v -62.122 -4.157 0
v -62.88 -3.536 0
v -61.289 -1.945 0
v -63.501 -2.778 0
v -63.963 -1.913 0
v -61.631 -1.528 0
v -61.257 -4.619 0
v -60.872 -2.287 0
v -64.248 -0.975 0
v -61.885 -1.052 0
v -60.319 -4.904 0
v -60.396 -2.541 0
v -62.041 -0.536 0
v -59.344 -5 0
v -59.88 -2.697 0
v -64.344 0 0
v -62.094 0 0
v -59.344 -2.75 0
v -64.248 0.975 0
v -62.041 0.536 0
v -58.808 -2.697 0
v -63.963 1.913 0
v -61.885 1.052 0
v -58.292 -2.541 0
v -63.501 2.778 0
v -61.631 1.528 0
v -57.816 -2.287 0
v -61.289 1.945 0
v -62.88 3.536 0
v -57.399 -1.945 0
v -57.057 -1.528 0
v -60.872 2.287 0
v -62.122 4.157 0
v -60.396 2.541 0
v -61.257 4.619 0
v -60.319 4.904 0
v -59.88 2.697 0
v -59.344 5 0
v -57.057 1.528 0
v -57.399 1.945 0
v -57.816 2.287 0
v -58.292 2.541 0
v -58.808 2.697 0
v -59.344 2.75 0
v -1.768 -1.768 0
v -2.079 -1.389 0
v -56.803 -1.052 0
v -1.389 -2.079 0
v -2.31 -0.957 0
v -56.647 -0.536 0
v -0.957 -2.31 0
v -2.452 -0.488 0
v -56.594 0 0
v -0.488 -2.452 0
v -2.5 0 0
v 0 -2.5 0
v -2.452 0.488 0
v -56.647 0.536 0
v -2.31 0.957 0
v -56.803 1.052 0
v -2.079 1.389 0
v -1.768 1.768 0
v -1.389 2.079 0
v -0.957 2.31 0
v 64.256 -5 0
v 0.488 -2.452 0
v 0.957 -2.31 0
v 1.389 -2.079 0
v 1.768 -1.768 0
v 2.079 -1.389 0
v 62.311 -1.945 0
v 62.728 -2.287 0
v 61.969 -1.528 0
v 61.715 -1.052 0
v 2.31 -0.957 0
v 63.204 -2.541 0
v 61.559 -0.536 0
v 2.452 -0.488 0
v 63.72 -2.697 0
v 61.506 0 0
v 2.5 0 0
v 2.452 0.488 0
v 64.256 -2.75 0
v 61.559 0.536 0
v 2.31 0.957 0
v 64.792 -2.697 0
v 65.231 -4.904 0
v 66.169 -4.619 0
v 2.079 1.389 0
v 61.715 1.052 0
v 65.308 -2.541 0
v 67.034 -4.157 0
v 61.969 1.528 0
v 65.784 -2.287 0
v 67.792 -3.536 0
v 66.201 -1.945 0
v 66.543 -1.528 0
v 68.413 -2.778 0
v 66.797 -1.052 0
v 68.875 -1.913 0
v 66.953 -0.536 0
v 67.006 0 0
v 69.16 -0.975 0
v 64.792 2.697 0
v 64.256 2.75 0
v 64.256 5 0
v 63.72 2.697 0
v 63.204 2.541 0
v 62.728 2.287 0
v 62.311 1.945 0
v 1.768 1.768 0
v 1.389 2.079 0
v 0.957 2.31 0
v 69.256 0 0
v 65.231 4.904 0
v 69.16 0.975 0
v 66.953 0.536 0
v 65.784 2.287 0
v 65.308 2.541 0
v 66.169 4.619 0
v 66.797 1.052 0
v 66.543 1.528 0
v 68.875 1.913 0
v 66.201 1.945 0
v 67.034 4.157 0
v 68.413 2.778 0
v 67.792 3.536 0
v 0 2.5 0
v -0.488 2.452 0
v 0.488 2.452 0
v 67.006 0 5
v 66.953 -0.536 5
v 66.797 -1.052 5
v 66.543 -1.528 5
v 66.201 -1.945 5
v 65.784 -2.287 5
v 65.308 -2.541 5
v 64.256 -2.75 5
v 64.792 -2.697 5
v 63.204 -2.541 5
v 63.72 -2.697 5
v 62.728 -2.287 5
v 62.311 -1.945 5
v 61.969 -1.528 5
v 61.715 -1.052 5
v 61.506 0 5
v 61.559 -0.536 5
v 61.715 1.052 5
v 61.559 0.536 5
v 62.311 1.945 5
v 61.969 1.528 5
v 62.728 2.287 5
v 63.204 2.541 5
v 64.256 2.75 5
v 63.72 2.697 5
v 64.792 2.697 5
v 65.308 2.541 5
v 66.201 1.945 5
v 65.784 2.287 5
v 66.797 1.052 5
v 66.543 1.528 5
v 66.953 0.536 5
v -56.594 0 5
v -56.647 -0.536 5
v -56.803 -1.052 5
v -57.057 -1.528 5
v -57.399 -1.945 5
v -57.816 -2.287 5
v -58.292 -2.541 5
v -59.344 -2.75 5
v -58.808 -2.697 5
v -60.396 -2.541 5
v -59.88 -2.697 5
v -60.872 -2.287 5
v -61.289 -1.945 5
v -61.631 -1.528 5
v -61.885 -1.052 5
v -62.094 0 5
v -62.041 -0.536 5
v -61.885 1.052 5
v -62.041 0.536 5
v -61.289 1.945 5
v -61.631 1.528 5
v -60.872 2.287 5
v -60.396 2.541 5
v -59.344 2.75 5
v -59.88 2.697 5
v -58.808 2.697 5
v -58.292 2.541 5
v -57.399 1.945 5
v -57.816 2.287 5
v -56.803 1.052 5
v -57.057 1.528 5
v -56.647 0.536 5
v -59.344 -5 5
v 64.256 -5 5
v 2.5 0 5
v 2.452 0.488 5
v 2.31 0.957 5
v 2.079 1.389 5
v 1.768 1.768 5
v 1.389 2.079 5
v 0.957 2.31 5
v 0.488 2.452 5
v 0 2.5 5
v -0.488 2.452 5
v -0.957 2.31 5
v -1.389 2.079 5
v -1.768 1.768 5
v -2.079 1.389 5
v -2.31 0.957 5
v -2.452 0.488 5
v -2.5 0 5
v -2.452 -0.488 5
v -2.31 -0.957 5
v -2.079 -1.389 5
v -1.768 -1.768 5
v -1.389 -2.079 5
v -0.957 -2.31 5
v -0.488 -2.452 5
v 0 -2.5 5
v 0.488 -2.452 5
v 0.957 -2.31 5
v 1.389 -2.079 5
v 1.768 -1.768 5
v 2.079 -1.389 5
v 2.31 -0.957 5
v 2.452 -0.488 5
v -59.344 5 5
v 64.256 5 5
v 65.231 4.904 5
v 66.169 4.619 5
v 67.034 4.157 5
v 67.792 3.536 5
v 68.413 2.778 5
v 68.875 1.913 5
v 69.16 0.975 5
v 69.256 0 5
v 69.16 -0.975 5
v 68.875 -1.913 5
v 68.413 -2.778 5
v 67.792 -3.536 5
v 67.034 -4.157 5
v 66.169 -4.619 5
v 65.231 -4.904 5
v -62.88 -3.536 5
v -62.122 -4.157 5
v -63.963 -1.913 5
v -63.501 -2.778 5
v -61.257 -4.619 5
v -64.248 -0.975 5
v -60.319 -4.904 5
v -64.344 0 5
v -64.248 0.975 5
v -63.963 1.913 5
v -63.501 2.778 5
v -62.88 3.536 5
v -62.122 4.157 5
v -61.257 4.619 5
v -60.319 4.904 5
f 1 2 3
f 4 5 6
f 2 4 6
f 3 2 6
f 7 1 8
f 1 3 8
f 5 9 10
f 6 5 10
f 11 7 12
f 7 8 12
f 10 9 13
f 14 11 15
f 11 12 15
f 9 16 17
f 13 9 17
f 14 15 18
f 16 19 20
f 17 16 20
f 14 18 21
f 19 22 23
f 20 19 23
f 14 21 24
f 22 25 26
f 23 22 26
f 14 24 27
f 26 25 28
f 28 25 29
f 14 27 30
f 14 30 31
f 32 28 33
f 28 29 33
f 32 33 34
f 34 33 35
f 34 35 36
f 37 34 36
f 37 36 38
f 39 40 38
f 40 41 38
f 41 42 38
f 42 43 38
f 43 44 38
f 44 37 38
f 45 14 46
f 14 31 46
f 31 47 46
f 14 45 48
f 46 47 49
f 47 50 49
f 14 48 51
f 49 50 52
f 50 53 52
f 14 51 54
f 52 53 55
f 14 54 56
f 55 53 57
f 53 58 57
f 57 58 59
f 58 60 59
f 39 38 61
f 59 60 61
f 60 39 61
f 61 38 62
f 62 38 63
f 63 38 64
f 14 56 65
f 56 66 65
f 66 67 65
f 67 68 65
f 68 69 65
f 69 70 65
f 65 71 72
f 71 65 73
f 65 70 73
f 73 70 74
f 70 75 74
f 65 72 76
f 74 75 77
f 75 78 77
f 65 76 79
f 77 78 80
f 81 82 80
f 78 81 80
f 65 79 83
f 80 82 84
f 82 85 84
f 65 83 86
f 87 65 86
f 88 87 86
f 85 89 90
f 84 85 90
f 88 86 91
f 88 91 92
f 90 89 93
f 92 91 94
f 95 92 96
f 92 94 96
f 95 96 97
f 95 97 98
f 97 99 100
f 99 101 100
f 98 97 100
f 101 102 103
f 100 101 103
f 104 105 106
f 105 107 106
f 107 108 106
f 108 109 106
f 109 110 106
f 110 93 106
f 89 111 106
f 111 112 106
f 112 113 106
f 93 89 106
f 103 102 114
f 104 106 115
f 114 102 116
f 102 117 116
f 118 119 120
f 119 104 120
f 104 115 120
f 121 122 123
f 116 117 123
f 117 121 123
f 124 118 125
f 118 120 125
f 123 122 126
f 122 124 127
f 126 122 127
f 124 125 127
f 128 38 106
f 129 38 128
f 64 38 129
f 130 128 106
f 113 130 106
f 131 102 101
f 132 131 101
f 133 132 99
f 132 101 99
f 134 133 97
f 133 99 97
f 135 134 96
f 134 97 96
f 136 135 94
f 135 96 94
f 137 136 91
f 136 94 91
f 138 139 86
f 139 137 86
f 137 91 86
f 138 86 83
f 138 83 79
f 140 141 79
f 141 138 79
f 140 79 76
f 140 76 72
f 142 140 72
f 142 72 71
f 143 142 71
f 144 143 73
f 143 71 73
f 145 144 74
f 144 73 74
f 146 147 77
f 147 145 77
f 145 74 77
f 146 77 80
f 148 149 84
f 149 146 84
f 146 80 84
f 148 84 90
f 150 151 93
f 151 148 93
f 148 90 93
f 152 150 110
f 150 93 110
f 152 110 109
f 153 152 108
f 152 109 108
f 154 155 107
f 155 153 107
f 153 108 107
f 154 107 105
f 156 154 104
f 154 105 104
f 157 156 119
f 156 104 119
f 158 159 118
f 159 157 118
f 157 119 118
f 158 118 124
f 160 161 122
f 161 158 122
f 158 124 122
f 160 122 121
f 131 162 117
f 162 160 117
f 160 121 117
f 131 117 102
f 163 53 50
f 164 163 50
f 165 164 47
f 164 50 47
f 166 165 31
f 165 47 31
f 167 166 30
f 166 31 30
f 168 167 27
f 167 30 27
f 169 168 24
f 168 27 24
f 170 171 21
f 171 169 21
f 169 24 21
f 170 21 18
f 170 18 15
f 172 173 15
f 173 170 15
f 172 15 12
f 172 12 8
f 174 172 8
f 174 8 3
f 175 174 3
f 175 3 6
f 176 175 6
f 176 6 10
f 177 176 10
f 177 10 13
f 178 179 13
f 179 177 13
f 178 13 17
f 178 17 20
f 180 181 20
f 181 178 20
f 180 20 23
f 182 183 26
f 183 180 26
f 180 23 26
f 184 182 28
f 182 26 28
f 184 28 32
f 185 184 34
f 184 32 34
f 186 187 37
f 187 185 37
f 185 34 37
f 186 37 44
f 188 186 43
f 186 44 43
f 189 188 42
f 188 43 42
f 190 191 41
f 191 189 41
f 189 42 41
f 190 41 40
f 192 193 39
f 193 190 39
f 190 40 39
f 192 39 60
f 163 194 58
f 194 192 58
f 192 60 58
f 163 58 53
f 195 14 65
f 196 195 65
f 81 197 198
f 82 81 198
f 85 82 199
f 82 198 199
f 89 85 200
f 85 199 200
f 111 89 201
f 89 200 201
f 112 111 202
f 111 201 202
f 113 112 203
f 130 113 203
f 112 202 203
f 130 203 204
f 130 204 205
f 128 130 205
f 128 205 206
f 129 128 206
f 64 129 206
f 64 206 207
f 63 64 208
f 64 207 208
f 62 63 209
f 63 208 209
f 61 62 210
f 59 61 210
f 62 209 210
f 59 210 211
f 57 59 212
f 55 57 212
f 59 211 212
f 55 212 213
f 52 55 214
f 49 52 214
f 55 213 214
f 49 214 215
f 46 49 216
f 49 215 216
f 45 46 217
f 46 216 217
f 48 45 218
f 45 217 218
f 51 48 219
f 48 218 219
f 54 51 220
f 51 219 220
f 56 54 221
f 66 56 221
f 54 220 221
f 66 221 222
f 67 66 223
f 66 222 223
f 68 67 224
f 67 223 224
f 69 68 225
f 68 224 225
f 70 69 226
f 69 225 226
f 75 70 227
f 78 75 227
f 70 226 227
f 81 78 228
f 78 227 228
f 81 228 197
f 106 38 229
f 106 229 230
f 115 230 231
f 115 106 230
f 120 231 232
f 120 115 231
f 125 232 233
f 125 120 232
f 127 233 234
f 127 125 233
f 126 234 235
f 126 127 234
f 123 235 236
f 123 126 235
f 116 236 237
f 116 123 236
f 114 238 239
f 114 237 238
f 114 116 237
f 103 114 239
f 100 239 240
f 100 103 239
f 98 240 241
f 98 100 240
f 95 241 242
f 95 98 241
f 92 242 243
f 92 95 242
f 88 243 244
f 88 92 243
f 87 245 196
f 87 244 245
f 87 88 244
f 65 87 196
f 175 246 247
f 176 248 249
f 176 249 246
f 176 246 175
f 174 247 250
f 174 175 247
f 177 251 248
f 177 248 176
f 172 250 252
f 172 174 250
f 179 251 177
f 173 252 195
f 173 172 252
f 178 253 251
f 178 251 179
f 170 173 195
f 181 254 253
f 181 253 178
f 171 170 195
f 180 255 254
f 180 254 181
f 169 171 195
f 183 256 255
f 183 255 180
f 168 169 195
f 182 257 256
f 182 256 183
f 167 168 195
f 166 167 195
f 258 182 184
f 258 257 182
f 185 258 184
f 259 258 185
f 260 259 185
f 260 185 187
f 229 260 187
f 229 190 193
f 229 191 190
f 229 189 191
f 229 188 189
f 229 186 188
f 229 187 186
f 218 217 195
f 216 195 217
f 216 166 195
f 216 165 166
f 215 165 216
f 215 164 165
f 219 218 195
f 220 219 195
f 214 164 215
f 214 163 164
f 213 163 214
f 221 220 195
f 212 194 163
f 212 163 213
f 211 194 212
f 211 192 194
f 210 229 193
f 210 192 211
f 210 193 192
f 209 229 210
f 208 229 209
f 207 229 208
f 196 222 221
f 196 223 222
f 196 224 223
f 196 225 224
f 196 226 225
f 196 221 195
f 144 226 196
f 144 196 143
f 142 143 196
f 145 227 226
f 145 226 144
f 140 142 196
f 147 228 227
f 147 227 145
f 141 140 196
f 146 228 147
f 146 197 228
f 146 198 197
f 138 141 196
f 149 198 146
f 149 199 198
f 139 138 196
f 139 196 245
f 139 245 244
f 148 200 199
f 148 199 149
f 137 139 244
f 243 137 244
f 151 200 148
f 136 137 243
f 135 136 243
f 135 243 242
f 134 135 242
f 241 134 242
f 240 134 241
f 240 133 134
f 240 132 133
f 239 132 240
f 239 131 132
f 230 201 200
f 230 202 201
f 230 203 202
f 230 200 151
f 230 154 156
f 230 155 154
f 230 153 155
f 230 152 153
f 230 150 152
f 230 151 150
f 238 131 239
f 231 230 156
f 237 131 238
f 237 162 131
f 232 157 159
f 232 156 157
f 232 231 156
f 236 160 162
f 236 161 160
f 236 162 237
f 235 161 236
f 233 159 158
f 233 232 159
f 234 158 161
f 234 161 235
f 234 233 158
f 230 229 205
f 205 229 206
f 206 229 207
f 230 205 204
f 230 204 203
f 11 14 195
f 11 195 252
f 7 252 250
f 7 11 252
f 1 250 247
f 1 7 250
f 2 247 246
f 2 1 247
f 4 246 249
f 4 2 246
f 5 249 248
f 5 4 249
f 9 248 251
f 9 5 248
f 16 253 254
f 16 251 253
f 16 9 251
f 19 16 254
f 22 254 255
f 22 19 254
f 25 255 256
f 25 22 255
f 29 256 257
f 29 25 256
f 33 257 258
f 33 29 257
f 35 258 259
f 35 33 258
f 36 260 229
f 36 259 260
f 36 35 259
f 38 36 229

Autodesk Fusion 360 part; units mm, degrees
sketch "Boceto1" plane through (0, 0, 0) normal (0, 0, 1) x (1, 0, 0)
  line L0 (0, -23.8223) -> (0, 23.8223) construction
  circle A0 centre (64.256, 0) radius 2.75
  line L1 (-59.344, 5) -> (64.256, 5)
  line L2 (0, 0) -> (11, 0) construction
  line L3 (-59.344, -5) -> (64.256, -5)
  arc A1 (64.256, -5) -> (64.256, 5) centre (64.256, 0) ccw
  circle A2 centre (-59.344, 0) radius 2.75
  arc A3 (-59.344, 5) -> (-59.344, -5) centre (-59.344, 0) ccw
  dimension "d1" = 5.5
  dimension "d2" = 64.256
  dimension "d4" = 10
  dimension "d10" = 5.5
  dimension "d11" = 123.6
  dimension "d12" = 5
extrude "Extruir1" add sketch "Boceto1" along normal blind 5
sketch "Boceto2" plane through (0, 0, 5) normal (0, 0, 1) x (1, 0, 0)
  circle A0 centre (64.256, 0) radius 2.75
  line L0 (-59.344, -5) -> (64.256, -5)
  arc A1 (64.256, -5) -> (64.256, 5) centre (64.256, 0) ccw
  line L1 (64.256, 5) -> (-59.344, 5)
  circle A2 centre (0, 0) radius 2.5
  arc A3 (-59.344, 5) -> (-59.344, -5) centre (-59.344, 0) ccw
  circle A4 centre (-59.344, 0) radius 2.75
  dimension "d8" = 5
extrude "Extruir2" cut sketch "Boceto2" against normal through all contours A2
equation "d2 = ( 128.512 / 2 ) * 1 mm"
